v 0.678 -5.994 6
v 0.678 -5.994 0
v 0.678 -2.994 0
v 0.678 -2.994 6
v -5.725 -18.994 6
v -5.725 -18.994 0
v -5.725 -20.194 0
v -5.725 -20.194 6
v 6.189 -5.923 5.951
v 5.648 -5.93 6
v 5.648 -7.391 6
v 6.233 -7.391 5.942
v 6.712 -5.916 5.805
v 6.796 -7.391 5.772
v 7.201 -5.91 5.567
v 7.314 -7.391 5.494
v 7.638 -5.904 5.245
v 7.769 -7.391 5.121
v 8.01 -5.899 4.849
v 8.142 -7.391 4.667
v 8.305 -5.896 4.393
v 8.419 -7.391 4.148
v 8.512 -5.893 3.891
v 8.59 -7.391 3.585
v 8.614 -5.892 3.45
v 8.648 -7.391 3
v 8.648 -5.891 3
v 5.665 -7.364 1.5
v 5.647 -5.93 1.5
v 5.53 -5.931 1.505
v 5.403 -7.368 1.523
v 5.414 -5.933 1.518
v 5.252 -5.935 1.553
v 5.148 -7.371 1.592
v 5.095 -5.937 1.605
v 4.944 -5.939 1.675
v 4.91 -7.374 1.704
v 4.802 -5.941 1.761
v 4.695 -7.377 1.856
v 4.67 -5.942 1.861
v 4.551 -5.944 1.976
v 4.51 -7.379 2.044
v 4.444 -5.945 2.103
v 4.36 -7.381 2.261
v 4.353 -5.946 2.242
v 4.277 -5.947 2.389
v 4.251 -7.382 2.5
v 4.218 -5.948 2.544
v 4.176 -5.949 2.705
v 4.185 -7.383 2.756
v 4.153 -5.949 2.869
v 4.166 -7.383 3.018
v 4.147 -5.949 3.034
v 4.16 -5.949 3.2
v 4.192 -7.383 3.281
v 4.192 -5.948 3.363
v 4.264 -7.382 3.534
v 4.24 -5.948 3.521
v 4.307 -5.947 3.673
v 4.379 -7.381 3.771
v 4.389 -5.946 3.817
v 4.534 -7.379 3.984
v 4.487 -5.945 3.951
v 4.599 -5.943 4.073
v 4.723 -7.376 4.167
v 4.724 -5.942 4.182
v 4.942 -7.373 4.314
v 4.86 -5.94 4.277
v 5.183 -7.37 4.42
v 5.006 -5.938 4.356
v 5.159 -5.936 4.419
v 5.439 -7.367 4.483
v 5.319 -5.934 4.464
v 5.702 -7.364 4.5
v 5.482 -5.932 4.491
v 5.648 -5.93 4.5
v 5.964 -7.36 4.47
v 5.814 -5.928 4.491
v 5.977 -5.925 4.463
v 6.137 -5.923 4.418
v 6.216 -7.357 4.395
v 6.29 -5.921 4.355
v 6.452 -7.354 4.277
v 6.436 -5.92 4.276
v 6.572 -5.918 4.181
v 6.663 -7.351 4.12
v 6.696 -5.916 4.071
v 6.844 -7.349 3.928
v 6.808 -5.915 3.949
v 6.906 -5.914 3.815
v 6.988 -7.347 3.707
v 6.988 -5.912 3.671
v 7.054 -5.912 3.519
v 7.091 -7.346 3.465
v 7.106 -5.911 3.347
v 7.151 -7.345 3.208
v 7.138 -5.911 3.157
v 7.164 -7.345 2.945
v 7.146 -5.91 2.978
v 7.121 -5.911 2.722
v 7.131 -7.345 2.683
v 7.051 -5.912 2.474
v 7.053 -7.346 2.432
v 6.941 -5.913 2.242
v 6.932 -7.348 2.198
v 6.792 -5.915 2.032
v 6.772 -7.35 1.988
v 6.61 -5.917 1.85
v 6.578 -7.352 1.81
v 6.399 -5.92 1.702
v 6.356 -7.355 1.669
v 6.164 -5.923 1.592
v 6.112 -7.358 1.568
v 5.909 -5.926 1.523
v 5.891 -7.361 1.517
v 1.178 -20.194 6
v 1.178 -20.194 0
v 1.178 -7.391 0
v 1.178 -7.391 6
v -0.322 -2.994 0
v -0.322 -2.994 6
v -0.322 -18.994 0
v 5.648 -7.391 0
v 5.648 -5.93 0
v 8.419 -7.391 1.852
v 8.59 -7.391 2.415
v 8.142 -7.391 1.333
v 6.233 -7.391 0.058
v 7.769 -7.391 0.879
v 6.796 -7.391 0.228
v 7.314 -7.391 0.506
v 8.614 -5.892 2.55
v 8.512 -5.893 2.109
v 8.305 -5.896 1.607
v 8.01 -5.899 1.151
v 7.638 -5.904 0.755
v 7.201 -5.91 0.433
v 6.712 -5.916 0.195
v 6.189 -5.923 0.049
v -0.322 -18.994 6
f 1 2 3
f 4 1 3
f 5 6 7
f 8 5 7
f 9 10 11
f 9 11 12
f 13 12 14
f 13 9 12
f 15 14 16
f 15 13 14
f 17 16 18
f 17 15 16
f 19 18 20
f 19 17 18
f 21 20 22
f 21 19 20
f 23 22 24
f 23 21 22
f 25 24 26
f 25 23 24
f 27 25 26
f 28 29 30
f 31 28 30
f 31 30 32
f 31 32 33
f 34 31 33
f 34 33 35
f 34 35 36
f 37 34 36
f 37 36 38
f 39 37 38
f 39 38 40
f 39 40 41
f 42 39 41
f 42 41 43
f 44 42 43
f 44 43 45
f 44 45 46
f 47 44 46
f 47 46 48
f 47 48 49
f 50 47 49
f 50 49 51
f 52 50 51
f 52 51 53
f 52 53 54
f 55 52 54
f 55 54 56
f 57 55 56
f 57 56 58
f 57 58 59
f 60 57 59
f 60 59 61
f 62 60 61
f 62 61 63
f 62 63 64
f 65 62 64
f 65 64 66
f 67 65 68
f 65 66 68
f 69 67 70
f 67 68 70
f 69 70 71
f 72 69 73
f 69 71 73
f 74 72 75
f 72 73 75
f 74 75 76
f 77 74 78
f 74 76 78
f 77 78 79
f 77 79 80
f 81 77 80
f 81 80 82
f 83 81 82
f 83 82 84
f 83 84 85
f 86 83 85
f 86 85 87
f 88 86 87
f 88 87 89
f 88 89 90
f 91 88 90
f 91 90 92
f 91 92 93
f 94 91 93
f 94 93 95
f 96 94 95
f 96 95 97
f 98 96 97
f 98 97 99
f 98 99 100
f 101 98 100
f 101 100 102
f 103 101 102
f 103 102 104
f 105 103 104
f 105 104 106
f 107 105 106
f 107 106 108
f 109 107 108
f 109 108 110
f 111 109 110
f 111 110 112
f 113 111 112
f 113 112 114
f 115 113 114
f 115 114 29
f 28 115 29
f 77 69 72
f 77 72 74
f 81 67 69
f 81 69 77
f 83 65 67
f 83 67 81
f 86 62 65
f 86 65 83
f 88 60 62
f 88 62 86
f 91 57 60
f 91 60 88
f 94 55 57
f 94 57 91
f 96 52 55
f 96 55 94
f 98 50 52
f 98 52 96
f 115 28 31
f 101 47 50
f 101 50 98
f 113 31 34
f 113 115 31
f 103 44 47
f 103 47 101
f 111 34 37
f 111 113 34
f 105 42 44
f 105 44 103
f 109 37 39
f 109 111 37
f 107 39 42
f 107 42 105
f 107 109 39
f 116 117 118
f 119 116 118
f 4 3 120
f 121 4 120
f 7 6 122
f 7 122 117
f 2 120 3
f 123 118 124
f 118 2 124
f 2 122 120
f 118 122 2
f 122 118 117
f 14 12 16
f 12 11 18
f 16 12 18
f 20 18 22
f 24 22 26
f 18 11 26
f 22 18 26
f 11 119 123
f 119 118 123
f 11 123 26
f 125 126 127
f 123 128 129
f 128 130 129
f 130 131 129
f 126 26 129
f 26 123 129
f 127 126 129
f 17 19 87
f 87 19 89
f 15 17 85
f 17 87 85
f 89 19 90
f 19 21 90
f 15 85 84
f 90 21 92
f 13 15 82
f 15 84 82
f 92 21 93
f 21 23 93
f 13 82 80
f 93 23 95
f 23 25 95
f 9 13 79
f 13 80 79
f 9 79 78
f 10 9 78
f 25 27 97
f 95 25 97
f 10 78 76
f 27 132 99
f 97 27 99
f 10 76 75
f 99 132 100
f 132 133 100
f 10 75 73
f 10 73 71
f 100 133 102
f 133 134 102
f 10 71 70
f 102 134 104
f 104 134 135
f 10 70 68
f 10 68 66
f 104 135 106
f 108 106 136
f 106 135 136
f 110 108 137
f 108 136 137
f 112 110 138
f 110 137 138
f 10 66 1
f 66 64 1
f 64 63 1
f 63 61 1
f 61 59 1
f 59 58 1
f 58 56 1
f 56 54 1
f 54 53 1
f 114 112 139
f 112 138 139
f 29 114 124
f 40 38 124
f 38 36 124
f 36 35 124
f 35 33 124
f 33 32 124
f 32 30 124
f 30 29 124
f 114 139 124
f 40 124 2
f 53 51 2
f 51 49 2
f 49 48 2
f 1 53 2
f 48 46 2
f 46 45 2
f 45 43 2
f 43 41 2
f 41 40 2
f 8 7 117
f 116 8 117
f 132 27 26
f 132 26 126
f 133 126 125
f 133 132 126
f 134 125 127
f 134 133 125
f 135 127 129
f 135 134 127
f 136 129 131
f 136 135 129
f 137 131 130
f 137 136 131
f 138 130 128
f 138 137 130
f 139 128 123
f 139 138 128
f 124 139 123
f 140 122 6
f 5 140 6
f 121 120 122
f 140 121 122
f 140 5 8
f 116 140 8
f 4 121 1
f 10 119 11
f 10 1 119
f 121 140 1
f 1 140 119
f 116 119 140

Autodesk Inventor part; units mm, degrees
ref_plane "YZ Plane" through (0, 0, 0) normal (1, 0, 0) x (0, 1, 0)
ref_plane "XZ Plane" through (0, 0, 0) normal (0, 1, 0) x (-1, 0, 0)
ref_plane "XY Plane" through (0, 0, 0) normal (0, 0, 1) x (1, 0, 0)
sketch "草圖1" plane through (0, 0, 0) normal (0, 0, 1) x (1, 0, 0)
  line L0 (-0.3223, -18.9936) -> (-5.7251, -18.9936)
  line L1 (-5.7251, -18.9936) -> (-5.7251, -20.1936)
  line L2 (-5.7251, -20.1936) -> (1.1777, -20.1936)
  line L3 (1.1777, -20.1936) -> (1.1777, -7.3911)
  line L4 (1.1777, -7.3911) -> (8.6477, -7.3911)
  line L5 (8.6477, -7.3911) -> (8.6477, -5.8911)
  line L6 (8.6477, -5.8911) -> (0.6777, -5.9936)
  line L7 (0.6777, -5.9936) -> (0.6777, -2.9936)
  line L8 (0.6777, -2.9936) -> (-0.3223, -2.9936)
  line L9 (-0.3223, -2.9936) -> (-0.3223, -18.9936)
  line L10 (0.6477, -6) -> (-0.2923, -6) projected
  line L11 (0.6477, 0) -> (0.6477, -6) projected
  line L12 (-0.2923, 0) -> (0.6477, 0) projected
  line L13 (-0.2923, 0) -> (-0.2923, -6) projected
  line L14 (4.1477, 0) -> (7.1477, 0) projected
  line L15 (4.1477, 0) -> (4.1477, -6)
  line L16 (7.1477, 0) -> (7.1477, -6)
  line L17 (7.1477, -6) -> (4.1477, -6) projected
  point P0 (0.1784, -6)
  point P1 (0.1777, -6)
  point P2 (8.6477, -6.6411)
  dimension "d0" = 1
  dimension "d3" = 0.94
  dimension "d4" = 0.03
  dimension "d5" = 3
  dimension "d6" = 1.5
  dimension "d7" = 1.2
  dimension "d8" = 16
  dimension "d9" = 1.5
  dimension "d10" = 1.5
extrude "擠出1" add sketch "草圖1" along normal blind 6 contours L9 L8 L13 L10 L11 L7 L6 L15 L17 L16 L5 L4 L3 L2 L1 L0 | L8 L11 L10 L13 | L6 L16 L17 L15
fillet "圓角1" radius 3 2 edges at (8.6477, -6.6411, 6) (8.6477, -6.6411, 0)
sketch "草圖3" plane through (0.6777, -5.9936, 6) normal (-0.0128564, 0.9999174, 0) x (0.9999174, 0.0128564, 0)
  ellipse E0 centre (5.0466, 3) end of major axis (5.0466, 1.5) minor radius 1.4999 construction
  ellipse E1 centre (4.9695, 3) end of major axis (4.9695, 4.5) minor radius 1.4999 projected
  point P0 (-0.6006, 6)
extrude "擠出2" cut sketch "草圖3" against normal up to surface (1.4326 mm away)
equation "\"d4\" = -0.5 * d3 + 0.5 * d0"
properties part number "j1 enndstop blocker"
